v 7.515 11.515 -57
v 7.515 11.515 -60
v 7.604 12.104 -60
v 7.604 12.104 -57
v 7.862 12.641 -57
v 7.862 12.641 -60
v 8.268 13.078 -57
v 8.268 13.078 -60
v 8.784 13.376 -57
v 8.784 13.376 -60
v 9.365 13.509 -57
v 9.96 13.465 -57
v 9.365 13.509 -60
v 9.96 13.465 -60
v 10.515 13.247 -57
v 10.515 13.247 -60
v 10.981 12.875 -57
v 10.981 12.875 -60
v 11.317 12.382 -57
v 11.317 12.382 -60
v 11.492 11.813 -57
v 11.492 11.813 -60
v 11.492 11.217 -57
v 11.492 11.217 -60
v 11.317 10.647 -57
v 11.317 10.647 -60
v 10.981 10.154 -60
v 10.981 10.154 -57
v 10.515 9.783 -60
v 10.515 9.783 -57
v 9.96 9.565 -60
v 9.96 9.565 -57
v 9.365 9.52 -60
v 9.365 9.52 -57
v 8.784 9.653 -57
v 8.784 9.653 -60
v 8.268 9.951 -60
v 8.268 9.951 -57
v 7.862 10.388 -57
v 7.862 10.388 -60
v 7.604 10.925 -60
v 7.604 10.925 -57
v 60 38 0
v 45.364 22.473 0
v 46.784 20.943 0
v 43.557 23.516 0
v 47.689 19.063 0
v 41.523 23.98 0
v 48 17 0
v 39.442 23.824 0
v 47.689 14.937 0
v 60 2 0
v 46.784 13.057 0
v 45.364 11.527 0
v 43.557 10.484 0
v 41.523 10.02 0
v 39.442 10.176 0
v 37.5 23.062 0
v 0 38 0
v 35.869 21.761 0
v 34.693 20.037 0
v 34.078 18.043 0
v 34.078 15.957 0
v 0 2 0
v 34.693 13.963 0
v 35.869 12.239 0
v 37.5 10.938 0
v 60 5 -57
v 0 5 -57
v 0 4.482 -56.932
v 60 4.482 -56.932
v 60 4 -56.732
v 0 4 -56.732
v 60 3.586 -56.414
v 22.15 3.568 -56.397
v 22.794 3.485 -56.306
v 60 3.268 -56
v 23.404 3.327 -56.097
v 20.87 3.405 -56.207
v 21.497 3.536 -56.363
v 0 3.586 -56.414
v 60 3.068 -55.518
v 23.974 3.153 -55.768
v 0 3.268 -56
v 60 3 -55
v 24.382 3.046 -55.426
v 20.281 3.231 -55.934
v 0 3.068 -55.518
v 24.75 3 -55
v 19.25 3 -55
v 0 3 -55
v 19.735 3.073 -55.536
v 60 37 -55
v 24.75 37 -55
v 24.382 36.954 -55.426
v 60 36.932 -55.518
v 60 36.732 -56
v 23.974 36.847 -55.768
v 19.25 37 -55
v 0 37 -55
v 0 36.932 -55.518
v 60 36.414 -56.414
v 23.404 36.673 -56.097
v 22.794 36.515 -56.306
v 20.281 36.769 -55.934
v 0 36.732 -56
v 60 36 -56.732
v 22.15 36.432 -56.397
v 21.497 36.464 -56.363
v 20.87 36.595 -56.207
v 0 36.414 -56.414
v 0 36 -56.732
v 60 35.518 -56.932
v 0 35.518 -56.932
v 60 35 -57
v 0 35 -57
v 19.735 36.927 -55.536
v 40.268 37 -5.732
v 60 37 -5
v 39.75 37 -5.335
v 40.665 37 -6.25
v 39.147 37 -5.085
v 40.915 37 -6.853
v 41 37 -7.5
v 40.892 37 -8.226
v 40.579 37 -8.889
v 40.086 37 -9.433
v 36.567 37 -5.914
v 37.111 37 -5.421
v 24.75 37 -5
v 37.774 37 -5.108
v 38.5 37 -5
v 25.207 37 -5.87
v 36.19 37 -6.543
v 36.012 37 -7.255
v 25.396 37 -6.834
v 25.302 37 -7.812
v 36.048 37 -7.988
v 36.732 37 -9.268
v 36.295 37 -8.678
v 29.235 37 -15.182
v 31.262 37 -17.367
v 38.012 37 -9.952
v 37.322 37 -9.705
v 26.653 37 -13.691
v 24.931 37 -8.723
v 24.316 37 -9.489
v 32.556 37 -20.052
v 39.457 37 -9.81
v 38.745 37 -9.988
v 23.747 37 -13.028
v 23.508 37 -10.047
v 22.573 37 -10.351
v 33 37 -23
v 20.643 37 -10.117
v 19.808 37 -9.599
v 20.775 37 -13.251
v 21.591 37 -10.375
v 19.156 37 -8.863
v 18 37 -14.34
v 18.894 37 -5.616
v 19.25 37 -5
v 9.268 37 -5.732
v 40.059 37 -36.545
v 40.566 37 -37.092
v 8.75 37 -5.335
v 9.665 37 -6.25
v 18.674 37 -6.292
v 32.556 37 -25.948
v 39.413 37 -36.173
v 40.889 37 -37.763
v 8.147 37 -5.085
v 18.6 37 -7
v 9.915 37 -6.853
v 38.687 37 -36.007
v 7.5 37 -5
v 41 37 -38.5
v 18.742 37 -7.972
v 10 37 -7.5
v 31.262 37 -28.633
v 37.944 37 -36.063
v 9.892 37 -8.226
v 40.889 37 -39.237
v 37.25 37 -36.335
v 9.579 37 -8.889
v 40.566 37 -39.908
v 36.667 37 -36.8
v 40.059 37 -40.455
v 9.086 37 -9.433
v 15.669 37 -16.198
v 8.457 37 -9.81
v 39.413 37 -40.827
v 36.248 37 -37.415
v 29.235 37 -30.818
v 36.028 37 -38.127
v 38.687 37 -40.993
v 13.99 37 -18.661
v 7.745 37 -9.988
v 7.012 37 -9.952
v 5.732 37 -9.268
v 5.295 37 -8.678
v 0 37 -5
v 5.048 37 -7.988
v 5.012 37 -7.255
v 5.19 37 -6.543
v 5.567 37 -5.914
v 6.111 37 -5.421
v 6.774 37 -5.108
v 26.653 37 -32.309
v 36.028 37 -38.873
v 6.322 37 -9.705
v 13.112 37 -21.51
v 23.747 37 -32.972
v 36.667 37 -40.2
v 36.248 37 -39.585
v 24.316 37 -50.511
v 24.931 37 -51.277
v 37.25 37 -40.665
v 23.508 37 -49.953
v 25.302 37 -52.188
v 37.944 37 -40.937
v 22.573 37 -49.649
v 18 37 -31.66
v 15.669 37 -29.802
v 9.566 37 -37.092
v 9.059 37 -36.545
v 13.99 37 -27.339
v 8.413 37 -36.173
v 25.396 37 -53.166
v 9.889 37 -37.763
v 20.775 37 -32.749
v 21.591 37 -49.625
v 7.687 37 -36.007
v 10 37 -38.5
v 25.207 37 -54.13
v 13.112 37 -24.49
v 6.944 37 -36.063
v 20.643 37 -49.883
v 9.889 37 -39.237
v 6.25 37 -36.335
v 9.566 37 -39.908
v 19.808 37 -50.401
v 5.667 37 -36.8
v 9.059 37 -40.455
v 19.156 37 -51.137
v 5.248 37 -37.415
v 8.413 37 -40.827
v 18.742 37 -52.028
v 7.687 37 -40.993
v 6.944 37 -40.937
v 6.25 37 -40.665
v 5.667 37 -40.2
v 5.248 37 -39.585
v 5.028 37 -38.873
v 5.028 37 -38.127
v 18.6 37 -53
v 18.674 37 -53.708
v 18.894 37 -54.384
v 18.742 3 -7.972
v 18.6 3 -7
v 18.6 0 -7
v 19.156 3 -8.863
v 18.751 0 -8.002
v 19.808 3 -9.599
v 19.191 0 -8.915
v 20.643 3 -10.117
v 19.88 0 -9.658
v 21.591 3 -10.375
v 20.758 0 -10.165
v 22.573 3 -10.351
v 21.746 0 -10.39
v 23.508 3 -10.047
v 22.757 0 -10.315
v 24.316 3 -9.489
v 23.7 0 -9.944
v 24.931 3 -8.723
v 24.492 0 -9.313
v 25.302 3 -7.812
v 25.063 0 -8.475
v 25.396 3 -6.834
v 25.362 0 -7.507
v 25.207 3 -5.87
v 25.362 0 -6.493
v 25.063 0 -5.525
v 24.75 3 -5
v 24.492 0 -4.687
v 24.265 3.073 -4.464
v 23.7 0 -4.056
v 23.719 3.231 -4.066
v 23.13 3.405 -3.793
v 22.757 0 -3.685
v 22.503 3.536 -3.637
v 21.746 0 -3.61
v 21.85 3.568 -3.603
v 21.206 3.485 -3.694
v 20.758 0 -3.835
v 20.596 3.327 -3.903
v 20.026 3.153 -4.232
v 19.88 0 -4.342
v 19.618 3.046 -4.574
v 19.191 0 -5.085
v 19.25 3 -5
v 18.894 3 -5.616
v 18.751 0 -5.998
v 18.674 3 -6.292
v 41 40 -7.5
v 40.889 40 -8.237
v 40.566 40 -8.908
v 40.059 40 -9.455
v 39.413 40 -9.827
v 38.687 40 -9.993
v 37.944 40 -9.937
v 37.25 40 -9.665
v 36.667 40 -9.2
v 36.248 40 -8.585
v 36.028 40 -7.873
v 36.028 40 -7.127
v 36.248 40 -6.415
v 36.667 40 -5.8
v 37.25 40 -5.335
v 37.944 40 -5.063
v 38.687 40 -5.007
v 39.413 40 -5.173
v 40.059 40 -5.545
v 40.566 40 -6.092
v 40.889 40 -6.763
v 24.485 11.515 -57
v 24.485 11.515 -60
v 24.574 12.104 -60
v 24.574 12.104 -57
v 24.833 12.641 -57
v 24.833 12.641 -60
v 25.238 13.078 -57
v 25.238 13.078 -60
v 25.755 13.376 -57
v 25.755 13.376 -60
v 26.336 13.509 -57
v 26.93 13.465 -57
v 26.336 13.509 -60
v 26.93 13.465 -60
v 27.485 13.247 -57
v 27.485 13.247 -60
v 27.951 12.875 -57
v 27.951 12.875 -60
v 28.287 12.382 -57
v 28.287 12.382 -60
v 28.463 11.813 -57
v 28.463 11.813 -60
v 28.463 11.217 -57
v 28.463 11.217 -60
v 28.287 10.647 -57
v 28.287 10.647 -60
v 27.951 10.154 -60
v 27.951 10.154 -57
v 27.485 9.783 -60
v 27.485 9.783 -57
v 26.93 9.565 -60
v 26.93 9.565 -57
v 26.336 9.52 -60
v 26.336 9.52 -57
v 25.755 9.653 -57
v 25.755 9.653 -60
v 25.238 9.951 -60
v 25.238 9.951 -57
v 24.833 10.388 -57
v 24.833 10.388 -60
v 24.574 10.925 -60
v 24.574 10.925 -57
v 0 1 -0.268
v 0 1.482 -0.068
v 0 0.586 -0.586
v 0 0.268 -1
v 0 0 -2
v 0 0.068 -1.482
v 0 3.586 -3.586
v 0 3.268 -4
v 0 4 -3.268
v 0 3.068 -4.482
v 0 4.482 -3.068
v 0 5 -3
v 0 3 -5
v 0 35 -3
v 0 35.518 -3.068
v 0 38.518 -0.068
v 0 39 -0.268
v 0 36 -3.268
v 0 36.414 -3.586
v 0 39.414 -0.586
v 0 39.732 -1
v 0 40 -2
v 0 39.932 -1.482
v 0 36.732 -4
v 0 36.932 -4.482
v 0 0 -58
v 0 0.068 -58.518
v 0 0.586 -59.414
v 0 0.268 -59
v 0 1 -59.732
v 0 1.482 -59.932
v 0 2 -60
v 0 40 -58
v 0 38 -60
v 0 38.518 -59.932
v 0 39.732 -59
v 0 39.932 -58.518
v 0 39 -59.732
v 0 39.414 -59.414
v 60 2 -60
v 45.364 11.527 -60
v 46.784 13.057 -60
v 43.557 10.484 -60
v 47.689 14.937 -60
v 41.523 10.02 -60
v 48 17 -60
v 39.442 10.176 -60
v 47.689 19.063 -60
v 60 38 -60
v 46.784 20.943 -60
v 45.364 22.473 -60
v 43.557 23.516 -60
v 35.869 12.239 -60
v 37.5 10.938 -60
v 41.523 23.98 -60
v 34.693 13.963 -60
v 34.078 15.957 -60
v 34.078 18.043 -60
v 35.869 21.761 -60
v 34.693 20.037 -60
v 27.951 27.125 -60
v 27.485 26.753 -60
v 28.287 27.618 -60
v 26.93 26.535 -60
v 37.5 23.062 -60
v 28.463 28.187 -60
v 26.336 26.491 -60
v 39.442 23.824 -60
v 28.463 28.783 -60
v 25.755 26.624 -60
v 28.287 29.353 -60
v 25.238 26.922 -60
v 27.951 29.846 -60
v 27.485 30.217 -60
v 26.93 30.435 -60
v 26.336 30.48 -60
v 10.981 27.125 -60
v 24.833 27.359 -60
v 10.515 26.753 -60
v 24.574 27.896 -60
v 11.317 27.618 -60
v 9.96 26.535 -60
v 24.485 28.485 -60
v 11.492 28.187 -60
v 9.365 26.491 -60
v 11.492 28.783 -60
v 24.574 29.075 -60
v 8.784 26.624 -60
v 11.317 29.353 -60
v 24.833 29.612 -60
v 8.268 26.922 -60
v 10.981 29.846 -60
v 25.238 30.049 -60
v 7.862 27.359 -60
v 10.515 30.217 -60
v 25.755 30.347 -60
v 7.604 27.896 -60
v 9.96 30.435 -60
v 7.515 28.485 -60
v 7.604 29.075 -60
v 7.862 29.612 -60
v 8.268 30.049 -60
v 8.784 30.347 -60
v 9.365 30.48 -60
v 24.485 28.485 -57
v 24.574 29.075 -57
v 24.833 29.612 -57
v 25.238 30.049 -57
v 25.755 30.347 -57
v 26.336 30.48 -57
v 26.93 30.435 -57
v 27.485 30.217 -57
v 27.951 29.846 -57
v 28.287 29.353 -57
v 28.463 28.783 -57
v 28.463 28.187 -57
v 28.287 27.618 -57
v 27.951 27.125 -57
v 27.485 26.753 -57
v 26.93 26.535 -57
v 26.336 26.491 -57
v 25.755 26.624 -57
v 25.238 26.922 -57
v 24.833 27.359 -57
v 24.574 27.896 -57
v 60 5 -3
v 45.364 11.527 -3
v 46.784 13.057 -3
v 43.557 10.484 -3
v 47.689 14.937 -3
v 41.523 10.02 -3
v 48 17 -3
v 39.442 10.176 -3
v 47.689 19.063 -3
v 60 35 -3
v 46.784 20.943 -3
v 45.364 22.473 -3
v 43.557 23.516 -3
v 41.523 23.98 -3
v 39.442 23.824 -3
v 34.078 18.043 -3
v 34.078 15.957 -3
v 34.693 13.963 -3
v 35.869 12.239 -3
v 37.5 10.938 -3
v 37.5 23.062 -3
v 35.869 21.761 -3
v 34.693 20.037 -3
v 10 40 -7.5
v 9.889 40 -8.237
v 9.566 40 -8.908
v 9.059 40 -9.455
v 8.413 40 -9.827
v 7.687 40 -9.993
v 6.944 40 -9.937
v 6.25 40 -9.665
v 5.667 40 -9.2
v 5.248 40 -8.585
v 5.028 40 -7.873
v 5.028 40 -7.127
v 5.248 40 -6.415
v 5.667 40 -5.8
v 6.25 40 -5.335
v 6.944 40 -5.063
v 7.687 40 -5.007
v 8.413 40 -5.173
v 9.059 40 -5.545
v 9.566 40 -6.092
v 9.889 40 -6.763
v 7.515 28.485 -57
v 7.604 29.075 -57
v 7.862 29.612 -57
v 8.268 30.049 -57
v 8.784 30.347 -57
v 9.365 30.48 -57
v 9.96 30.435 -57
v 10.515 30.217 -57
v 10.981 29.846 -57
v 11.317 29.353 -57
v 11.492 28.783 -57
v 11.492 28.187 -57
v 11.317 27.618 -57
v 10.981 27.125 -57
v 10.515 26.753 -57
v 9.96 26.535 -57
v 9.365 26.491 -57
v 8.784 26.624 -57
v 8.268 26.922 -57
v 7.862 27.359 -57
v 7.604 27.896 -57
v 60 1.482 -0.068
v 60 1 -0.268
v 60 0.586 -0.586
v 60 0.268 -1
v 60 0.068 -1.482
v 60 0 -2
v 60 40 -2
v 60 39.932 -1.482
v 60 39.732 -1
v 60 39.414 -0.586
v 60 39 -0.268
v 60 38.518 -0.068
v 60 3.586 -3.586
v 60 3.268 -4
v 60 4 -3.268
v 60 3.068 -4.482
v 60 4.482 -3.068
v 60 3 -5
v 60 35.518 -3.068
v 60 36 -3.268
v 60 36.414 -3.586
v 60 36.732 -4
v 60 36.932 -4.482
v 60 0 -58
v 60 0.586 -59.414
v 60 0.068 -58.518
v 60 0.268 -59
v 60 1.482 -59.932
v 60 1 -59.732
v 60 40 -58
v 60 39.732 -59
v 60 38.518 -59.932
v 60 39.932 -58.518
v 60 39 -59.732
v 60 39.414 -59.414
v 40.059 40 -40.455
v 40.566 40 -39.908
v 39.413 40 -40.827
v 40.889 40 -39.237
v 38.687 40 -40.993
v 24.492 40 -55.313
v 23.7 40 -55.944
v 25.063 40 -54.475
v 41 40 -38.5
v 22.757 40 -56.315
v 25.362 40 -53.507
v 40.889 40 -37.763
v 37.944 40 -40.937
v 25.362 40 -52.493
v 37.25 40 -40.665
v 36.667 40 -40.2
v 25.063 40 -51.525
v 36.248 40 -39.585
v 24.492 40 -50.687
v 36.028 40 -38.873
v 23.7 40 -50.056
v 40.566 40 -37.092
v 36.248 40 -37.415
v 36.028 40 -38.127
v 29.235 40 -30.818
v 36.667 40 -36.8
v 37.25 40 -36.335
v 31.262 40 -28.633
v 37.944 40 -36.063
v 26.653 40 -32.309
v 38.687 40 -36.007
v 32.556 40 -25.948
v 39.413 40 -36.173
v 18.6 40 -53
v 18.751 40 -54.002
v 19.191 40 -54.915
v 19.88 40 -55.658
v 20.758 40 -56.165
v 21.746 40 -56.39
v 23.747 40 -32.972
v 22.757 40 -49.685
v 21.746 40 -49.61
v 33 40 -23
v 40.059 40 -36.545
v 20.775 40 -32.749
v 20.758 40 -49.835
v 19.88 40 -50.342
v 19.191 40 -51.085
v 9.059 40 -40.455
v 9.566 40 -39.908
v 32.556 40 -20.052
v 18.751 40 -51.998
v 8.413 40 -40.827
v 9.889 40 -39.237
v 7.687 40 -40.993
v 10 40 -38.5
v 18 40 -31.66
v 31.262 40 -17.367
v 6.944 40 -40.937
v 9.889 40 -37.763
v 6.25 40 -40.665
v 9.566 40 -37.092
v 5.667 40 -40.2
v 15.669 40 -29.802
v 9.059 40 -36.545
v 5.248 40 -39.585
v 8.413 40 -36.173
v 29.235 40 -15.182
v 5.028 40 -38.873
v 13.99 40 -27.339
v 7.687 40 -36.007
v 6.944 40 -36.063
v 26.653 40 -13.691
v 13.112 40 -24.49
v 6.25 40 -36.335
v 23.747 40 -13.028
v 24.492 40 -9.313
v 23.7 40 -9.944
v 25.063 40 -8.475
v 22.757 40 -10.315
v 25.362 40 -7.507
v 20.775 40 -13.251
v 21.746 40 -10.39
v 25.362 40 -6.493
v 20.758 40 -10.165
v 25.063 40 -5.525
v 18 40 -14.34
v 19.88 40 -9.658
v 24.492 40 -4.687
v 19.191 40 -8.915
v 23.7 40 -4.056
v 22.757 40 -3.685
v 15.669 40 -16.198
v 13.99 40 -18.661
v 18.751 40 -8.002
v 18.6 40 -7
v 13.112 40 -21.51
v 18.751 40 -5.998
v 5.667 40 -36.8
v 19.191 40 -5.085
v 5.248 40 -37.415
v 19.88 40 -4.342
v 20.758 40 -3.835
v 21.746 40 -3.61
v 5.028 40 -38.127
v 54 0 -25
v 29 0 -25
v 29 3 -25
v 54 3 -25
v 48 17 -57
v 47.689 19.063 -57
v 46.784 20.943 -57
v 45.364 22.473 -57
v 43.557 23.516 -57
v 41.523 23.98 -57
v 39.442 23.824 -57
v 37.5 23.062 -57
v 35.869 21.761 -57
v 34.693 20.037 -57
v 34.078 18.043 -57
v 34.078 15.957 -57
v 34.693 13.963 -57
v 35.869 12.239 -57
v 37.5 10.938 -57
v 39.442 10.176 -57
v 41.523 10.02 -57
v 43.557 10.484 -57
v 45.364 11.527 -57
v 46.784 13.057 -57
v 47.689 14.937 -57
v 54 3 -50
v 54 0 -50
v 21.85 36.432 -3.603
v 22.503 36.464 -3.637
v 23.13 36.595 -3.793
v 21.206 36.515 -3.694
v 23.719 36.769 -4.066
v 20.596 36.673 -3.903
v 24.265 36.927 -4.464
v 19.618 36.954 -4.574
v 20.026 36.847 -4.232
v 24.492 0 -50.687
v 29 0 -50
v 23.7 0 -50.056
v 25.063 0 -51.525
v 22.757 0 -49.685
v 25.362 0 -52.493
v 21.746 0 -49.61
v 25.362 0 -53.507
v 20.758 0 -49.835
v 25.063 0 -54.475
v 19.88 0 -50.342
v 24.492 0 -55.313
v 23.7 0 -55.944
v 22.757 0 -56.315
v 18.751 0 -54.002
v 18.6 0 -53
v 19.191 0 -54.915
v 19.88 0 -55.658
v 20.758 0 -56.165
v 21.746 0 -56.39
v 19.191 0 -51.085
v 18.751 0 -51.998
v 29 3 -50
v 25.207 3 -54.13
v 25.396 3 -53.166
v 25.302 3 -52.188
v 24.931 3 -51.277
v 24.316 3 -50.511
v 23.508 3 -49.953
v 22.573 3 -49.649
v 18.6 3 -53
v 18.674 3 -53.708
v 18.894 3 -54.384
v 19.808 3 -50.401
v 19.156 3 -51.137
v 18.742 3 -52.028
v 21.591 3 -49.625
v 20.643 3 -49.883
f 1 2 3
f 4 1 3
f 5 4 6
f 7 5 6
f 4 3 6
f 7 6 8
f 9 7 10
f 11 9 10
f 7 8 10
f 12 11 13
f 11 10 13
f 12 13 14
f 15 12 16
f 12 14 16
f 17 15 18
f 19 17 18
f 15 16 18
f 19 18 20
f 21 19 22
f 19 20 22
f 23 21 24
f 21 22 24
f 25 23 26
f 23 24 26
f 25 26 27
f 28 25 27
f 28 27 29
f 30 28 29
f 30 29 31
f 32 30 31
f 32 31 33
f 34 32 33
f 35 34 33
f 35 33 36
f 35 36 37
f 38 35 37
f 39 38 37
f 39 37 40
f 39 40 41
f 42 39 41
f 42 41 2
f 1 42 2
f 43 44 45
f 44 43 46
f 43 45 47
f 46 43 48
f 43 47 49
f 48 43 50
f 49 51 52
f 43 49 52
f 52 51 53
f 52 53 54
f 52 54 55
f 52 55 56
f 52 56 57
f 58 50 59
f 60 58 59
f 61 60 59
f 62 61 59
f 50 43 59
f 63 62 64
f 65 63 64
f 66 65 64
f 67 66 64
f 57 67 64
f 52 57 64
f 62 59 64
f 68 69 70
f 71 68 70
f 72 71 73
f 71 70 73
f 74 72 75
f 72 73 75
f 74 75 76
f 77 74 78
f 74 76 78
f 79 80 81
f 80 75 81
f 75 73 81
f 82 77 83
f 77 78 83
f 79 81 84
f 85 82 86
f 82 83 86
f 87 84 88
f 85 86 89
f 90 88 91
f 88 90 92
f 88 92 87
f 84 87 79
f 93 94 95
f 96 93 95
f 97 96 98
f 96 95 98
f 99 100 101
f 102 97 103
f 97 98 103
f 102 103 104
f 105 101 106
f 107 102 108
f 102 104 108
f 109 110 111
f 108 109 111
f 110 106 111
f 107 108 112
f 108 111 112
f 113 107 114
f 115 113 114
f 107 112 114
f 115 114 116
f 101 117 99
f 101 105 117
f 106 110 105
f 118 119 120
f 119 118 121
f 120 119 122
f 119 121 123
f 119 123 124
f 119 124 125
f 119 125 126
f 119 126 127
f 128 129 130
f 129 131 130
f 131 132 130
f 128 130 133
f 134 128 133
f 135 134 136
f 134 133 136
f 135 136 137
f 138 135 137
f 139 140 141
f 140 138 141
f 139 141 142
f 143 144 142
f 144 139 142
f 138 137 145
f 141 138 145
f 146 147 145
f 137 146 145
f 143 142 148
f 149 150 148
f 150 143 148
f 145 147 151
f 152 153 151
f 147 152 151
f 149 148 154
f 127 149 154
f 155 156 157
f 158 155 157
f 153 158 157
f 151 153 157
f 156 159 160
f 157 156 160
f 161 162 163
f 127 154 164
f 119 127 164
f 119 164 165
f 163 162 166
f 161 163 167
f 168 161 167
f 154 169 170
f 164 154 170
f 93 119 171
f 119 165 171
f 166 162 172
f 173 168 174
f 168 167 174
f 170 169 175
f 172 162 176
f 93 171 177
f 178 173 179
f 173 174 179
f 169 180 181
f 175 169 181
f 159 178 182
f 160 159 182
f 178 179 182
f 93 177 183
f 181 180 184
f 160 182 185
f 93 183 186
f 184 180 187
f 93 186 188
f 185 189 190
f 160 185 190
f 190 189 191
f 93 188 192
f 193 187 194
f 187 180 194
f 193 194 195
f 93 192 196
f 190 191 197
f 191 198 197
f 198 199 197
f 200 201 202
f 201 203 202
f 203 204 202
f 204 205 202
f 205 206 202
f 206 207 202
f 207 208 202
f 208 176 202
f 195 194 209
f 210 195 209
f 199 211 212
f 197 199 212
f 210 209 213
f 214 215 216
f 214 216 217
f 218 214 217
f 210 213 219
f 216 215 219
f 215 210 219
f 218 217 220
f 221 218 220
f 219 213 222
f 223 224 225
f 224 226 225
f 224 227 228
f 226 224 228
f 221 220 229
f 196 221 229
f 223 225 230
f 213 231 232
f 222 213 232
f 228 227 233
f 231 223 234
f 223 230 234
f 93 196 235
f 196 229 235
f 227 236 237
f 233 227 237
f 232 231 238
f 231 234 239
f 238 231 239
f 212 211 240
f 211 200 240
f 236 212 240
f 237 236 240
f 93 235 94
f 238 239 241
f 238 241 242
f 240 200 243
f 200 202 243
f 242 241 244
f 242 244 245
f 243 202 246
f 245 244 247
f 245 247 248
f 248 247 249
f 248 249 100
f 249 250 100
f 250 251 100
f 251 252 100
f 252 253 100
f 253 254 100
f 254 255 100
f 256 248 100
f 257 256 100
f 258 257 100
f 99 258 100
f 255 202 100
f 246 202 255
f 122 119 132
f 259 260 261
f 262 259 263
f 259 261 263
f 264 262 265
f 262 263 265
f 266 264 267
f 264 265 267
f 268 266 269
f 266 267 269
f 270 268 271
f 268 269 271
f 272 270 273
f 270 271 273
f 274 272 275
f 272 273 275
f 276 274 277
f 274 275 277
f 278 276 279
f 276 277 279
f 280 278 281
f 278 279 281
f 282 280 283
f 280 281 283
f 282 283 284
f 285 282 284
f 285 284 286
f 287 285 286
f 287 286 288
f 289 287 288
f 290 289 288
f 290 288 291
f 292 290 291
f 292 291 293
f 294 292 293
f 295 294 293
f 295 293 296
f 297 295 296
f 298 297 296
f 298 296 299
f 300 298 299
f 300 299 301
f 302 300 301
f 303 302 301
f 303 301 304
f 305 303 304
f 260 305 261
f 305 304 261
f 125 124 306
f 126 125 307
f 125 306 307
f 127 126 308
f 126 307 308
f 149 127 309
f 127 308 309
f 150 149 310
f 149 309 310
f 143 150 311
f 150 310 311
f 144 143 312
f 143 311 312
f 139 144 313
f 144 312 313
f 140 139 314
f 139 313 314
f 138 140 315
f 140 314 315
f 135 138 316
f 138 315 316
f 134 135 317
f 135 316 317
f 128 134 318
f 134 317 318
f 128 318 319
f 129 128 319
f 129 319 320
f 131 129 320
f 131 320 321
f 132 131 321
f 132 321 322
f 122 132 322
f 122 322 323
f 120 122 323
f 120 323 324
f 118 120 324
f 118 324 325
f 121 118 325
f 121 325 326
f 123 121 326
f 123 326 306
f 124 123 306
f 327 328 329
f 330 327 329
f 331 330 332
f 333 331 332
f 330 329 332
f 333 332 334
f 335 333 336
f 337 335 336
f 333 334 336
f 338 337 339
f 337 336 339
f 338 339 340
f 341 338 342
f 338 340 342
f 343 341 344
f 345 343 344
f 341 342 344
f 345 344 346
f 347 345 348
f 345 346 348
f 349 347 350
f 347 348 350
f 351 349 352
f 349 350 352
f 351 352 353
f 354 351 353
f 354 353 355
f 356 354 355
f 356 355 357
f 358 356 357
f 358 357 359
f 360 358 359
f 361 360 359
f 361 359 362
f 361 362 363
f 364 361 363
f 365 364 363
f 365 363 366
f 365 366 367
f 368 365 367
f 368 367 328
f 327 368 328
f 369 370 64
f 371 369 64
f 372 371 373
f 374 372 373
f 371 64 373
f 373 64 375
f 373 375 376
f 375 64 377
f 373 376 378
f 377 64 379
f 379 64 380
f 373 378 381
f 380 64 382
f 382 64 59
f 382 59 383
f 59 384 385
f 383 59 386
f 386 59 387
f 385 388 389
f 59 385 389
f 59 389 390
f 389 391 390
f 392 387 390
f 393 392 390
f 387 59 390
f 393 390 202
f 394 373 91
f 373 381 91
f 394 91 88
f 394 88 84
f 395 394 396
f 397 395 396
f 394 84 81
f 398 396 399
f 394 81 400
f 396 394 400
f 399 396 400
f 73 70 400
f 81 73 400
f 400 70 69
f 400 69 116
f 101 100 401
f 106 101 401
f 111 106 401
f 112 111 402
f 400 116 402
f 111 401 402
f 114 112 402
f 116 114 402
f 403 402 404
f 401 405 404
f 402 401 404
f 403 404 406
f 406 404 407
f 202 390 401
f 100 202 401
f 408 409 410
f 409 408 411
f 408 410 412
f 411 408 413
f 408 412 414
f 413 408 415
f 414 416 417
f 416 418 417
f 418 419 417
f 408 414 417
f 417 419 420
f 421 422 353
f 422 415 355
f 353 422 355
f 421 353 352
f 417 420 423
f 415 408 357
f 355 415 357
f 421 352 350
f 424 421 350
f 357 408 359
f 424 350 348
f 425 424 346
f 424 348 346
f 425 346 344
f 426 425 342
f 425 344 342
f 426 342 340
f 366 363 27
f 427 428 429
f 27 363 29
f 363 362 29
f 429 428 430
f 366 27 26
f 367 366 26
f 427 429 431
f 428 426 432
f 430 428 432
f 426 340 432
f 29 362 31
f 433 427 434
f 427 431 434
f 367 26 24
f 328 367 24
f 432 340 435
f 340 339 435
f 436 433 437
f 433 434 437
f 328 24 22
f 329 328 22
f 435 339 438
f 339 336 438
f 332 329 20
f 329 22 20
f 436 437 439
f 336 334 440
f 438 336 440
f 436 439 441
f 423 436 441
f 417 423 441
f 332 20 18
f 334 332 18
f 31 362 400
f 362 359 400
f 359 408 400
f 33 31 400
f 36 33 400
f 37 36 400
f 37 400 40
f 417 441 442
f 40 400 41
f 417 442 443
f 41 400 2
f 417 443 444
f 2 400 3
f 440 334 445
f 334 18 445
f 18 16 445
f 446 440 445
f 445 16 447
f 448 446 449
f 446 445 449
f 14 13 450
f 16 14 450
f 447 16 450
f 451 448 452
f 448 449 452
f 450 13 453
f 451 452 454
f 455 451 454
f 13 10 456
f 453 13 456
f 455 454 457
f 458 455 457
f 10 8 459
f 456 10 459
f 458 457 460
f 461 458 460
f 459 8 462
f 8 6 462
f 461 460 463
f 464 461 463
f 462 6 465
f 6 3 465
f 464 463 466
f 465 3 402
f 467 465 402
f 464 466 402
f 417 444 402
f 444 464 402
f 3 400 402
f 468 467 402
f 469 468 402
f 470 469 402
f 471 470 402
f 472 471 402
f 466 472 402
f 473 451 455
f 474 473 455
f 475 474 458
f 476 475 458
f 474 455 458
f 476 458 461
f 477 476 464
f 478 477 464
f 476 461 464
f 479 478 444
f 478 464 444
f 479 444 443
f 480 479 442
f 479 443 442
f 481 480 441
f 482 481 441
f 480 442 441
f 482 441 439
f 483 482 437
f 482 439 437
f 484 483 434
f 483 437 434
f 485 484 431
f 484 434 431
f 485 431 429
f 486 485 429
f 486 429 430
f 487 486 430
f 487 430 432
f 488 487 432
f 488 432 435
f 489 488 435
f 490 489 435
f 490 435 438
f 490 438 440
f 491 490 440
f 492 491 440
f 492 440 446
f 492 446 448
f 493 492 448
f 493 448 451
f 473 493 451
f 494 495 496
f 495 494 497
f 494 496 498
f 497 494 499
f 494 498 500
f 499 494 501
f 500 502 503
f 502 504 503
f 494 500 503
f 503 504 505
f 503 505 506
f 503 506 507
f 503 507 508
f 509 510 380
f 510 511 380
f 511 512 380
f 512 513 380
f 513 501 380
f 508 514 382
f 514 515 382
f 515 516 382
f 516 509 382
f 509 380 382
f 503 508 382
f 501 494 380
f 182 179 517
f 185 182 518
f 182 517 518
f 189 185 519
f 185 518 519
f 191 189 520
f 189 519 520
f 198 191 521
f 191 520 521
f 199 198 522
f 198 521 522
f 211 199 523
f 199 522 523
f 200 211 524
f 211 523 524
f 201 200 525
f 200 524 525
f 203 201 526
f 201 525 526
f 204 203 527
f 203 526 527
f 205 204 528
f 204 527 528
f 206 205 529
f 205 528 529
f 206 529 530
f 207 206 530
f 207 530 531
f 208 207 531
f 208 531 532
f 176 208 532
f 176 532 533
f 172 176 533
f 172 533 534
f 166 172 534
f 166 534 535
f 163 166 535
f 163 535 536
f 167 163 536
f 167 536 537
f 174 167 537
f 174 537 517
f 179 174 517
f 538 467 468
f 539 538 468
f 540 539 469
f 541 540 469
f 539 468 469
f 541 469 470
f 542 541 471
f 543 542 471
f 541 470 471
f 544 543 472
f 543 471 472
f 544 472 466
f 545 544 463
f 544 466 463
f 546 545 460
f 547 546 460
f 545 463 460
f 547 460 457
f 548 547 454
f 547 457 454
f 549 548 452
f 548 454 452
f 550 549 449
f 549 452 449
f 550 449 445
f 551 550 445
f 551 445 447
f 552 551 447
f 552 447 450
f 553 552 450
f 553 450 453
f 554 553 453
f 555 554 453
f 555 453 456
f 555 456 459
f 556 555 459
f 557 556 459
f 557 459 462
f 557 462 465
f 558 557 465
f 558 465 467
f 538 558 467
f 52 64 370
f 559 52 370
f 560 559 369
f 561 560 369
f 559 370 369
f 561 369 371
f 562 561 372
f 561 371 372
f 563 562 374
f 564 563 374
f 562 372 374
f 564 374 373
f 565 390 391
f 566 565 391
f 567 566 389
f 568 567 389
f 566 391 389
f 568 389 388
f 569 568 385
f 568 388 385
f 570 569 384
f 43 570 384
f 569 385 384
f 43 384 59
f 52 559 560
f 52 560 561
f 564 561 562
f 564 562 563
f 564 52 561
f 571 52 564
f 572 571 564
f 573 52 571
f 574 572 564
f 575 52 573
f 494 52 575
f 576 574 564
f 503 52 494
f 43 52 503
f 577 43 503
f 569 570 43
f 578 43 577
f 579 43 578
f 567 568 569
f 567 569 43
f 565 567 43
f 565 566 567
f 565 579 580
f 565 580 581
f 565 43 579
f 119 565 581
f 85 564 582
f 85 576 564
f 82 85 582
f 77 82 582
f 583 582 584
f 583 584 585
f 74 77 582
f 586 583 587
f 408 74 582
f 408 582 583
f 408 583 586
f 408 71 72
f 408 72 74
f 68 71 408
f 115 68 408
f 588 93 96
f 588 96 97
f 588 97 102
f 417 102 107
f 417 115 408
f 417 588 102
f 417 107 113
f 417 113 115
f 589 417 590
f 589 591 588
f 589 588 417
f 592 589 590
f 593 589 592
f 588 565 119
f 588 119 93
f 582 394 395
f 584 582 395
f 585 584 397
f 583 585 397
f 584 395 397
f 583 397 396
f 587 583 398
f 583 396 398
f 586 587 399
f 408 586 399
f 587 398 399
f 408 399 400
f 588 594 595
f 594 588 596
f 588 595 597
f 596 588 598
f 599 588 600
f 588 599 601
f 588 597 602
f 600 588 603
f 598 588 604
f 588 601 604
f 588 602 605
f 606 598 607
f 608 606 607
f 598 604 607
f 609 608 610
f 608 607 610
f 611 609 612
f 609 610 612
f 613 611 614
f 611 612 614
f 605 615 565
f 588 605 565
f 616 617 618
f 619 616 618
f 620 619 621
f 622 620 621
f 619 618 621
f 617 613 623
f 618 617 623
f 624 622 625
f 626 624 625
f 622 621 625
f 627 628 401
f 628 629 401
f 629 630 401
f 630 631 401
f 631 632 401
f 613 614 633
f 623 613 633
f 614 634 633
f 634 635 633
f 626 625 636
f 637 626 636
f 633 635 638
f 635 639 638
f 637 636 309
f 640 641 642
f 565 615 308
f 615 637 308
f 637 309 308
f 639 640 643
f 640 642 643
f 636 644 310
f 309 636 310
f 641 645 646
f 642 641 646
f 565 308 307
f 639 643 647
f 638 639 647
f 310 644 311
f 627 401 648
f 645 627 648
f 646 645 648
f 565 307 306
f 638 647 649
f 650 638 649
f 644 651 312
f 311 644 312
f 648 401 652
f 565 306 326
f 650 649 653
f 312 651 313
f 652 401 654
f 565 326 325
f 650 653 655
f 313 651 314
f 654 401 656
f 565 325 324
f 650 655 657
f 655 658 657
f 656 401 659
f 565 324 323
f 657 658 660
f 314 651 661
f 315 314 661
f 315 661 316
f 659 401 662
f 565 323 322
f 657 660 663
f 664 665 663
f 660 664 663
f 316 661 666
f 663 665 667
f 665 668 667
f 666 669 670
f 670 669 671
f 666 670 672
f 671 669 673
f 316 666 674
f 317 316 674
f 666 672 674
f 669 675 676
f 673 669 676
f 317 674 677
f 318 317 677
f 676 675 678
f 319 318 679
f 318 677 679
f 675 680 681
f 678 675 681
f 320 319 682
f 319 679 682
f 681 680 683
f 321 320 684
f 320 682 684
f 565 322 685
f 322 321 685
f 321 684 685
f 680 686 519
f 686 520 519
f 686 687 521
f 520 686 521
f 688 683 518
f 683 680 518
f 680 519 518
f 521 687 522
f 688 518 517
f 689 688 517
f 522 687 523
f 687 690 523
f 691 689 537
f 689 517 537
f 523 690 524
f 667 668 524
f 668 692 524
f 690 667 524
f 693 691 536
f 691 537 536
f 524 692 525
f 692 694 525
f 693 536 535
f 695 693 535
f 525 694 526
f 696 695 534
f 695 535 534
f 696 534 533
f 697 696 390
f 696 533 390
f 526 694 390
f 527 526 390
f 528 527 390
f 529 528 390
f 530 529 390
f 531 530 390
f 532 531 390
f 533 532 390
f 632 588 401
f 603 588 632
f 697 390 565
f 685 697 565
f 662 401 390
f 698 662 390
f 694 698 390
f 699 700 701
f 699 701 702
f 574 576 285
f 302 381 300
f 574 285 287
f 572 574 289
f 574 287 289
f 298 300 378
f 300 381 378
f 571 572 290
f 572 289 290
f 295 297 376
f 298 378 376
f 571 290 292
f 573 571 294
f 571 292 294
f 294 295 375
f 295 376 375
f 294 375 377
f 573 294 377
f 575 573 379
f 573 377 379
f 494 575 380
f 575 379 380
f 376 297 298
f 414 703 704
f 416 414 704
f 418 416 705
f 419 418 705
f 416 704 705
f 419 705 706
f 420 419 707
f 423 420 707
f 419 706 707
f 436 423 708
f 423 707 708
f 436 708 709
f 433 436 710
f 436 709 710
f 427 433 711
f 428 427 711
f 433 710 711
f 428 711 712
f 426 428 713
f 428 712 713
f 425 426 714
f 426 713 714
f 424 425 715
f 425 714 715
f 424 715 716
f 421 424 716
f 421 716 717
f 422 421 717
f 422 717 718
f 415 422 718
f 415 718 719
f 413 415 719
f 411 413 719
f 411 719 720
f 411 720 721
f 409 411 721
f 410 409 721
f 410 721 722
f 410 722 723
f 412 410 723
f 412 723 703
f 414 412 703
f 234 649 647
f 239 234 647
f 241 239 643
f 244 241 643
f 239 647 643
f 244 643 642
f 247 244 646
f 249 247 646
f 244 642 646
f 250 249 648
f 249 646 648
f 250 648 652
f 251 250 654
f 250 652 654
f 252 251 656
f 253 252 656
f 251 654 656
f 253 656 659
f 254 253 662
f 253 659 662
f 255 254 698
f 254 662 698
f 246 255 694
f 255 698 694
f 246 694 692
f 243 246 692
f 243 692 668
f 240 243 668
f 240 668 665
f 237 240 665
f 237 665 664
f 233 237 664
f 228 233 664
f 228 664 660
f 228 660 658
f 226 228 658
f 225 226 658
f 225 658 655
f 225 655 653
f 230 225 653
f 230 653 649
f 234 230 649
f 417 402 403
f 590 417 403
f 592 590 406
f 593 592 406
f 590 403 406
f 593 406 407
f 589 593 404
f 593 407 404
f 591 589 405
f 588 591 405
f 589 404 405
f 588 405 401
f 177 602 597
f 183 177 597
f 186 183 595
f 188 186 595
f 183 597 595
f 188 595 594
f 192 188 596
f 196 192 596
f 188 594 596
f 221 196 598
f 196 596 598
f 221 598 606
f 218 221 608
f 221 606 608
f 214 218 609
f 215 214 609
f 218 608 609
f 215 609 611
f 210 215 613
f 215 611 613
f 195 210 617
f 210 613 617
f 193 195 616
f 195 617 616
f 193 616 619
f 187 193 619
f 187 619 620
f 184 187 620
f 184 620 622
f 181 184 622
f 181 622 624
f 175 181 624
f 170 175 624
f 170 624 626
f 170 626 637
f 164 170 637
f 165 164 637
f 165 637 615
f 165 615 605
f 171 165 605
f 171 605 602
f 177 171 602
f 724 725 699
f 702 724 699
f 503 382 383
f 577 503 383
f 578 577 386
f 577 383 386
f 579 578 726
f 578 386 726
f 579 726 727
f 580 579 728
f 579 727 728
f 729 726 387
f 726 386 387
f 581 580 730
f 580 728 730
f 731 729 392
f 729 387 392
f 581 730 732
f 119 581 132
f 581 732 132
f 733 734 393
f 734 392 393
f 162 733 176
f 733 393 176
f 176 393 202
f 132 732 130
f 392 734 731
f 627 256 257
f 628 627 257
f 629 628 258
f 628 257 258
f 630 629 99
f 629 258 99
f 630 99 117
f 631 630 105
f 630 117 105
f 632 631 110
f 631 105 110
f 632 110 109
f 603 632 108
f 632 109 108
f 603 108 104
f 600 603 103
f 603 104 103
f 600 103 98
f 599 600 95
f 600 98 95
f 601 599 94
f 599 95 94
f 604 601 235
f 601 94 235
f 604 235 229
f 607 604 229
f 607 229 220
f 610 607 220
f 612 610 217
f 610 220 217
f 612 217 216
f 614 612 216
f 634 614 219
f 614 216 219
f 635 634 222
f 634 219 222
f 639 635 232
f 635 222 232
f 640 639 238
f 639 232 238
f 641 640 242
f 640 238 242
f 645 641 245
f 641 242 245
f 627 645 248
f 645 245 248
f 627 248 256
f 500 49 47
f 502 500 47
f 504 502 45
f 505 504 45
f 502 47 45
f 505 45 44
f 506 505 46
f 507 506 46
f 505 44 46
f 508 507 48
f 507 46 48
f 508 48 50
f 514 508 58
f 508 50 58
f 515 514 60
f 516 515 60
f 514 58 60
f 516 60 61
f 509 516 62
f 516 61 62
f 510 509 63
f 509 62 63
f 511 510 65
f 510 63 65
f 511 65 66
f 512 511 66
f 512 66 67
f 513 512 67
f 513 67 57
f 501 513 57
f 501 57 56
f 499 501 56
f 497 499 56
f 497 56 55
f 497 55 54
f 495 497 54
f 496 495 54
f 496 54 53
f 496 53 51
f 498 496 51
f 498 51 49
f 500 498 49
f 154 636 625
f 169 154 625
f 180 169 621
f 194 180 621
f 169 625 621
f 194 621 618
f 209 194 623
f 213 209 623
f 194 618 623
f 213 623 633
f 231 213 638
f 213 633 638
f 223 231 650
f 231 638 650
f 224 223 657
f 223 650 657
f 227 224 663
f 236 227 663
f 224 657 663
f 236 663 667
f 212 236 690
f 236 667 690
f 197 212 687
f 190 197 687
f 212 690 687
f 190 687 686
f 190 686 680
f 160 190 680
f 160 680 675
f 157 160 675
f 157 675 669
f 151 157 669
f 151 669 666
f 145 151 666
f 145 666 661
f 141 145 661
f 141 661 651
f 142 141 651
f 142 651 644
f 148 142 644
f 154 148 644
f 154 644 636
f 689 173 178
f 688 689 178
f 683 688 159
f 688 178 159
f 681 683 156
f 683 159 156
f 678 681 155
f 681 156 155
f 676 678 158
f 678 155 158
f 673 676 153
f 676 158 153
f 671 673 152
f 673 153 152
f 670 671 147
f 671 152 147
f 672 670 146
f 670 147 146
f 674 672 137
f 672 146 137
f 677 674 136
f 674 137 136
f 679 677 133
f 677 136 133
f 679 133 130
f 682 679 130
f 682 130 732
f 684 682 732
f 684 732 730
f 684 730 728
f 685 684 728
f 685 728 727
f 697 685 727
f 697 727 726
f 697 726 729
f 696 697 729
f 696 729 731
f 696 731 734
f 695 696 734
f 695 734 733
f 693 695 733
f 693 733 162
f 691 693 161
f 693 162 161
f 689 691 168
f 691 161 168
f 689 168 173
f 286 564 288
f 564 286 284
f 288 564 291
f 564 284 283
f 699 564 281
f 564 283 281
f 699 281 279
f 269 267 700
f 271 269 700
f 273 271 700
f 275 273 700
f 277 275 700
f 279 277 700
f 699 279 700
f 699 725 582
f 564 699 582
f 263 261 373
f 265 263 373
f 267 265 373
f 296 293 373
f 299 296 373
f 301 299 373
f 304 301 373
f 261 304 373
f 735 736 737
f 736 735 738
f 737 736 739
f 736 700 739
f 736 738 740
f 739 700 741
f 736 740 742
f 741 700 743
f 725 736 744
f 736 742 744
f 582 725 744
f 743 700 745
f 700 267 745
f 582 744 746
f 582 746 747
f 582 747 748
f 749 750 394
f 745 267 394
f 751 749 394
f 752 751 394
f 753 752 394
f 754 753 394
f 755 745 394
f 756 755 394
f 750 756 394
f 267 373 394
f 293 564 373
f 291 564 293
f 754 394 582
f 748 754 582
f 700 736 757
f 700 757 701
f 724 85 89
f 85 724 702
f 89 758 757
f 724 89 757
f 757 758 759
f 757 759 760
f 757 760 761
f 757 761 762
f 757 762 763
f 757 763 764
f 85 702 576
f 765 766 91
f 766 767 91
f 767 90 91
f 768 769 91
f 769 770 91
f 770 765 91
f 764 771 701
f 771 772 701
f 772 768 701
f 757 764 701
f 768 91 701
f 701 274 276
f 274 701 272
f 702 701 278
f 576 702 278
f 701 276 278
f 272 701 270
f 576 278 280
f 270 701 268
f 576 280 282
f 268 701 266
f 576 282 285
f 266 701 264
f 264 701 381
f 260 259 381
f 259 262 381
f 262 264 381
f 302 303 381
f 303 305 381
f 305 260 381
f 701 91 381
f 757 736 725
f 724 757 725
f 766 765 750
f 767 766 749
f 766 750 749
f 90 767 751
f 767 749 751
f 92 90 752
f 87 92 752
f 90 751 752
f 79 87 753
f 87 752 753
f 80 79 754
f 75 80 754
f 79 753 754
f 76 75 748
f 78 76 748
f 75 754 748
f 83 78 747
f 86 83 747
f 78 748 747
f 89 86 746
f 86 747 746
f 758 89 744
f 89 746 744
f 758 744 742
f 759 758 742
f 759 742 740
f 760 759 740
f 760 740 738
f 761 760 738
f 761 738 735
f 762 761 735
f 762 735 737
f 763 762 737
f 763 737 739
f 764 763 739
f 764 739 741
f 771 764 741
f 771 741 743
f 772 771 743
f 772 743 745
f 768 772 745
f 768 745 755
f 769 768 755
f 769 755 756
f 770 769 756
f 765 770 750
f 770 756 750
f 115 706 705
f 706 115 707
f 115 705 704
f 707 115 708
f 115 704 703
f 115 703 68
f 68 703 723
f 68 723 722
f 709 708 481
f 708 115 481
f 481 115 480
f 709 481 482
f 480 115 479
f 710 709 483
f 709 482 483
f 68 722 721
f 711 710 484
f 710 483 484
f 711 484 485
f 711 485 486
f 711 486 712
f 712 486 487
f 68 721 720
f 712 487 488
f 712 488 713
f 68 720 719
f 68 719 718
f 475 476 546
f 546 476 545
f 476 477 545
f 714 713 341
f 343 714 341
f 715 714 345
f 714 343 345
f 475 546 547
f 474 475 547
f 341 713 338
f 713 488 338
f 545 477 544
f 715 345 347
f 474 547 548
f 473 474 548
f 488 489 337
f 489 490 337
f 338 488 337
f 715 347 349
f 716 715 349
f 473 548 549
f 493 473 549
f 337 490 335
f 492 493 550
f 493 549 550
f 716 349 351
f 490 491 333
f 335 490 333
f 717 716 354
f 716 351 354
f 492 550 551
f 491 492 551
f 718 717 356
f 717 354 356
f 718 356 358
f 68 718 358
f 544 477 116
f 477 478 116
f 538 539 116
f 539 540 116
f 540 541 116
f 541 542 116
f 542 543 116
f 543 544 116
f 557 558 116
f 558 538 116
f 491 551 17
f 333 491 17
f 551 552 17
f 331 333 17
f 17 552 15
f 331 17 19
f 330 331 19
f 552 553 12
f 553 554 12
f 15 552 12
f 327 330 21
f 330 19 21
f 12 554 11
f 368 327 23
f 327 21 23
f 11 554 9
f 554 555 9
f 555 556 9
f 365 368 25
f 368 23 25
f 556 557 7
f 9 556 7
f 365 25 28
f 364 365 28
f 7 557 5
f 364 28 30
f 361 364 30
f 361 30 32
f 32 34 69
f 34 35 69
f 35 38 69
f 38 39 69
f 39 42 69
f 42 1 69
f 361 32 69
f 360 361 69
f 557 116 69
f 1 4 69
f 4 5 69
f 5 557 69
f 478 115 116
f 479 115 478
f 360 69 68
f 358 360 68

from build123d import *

# Parameters (mm, degrees)
EXTRUDE_1_DEPTH     = 60
CUT_EXTRUDE_1_REACH = 42
SKETCH_2_R          = 2.5
SKETCH_2_R_2        = 10
SKETCH_3_R          = 7
CUT_EXTRUDE_2_DEPTH = 61
HOLE_WIZARD_M8_1_D  = 6.8
CUT_EXTRUDE_3_REACH = 62
SKETCH_6_R          = 2
CUT_EXTRUDE_4_REACH = 42
SKETCH_7_W          = 25
SKETCH_7_H          = 25


with BuildPart() as part:
    # 草图1 → 凸台-拉伸1 (new body)
    with BuildSketch(Plane(origin=(0, 0, 0), x_dir=(0, 0, -1), z_dir=(1, 0, 0))):
        with BuildLine():
            Line((60, 2), (60, 38))
            ThreePointArc((60, 38), (59.414213562, 39.414213562), (58, 40))
            Line((58, 40), (2, 40))
            ThreePointArc((2, 40), (0.585786438, 39.414213562), (0, 38))
            Line((0, 38), (0, 2))
            ThreePointArc((0, 2), (0.585786438, 0.585786438), (2, 0))
            Line((2, 0), (58, 0))
            ThreePointArc((58, 0), (59.414213562, 0.585786438), (60, 2))
        make_face()
        with BuildLine():
            Line((3, 5), (3, 35))
            ThreePointArc((3, 35), (3.585786438, 36.414213562), (5, 37))
            Line((5, 37), (55, 37))
            ThreePointArc((55, 37), (56.414213562, 36.414213562), (57, 35))
            Line((57, 35), (57, 5))
            ThreePointArc((57, 5), (56.414213562, 3.585786438), (55, 3))
            Line((55, 3), (5, 3))
            ThreePointArc((5, 3), (3.585786438, 3.585786438), (3, 5))
        make_face(mode=Mode.SUBTRACT)
    extrude(amount=EXTRUDE_1_DEPTH)

    # 草图2 → 切除-拉伸1 (cut, up to next)
    with BuildSketch(Plane(origin=(0, 40, 0), x_dir=(1, 0, 0), z_dir=(0, 1, 0)), mode=Mode.PRIVATE) as cut_extrude_1_sk1:
        with Locations((7.5, 7.5)):
            Circle(SKETCH_2_R)
    cut_extrude_1_tool1 = extrude(cut_extrude_1_sk1.sketch, amount=-CUT_EXTRUDE_1_REACH, mode=Mode.PRIVATE) & part.part
    add(cut_extrude_1_tool1.solids().sort_by_distance((7.5, 40, -7.5))[0], mode=Mode.SUBTRACT)
    # 草图2 → 切除-拉伸1 (cut, up to next)
    with BuildSketch(Plane(origin=(0, 40, 0), x_dir=(1, 0, 0), z_dir=(0, 1, 0)), mode=Mode.PRIVATE) as cut_extrude_1_sk2:
        with Locations((38.5, 7.5)):
            Circle(SKETCH_2_R)
    cut_extrude_1_tool2 = extrude(cut_extrude_1_sk2.sketch, amount=-CUT_EXTRUDE_1_REACH, mode=Mode.PRIVATE) & part.part
    add(cut_extrude_1_tool2.solids().sort_by_distance((38.5, 40, -7.5))[0], mode=Mode.SUBTRACT)
    # 草图2 → 切除-拉伸1 (cut, up to next)
    with BuildSketch(Plane(origin=(0, 40, 0), x_dir=(1, 0, 0), z_dir=(0, 1, 0)), mode=Mode.PRIVATE) as cut_extrude_1_sk3:
        with Locations((38.5, 38.5)):
            Circle(SKETCH_2_R)
    cut_extrude_1_tool3 = extrude(cut_extrude_1_sk3.sketch, amount=-CUT_EXTRUDE_1_REACH, mode=Mode.PRIVATE) & part.part
    add(cut_extrude_1_tool3.solids().sort_by_distance((38.5, 40, -38.5))[0], mode=Mode.SUBTRACT)
    # 草图2 → 切除-拉伸1 (cut, up to next)
    with BuildSketch(Plane(origin=(0, 40, 0), x_dir=(1, 0, 0), z_dir=(0, 1, 0)), mode=Mode.PRIVATE) as cut_extrude_1_sk4:
        with Locations((7.5, 38.5)):
            Circle(SKETCH_2_R)
    cut_extrude_1_tool4 = extrude(cut_extrude_1_sk4.sketch, amount=-CUT_EXTRUDE_1_REACH, mode=Mode.PRIVATE) & part.part
    add(cut_extrude_1_tool4.solids().sort_by_distance((7.5, 40, -38.5))[0], mode=Mode.SUBTRACT)
    # 草图2 → 切除-拉伸1 (cut, up to next)
    with BuildSketch(Plane(origin=(0, 40, 0), x_dir=(1, 0, 0), z_dir=(0, 1, 0)), mode=Mode.PRIVATE) as cut_extrude_1_sk5:
        with Locations((23, 23)):
            Circle(SKETCH_2_R_2)
    cut_extrude_1_tool5 = extrude(cut_extrude_1_sk5.sketch, amount=-CUT_EXTRUDE_1_REACH, mode=Mode.PRIVATE) & part.part
    add(cut_extrude_1_tool5.solids().sort_by_distance((23, 40, -23))[0], mode=Mode.SUBTRACT)

    # 草图3 → 切除-拉伸2 (cut, through all)
    with BuildSketch(Plane.XY):
        with Locations((41, 17)):
            Circle(SKETCH_3_R)
    extrude(amount=-CUT_EXTRUDE_2_DEPTH, mode=Mode.SUBTRACT)

    # M8 螺纹孔1 (through all)
    with Locations(Plane(origin=(0, 40, 0), x_dir=(1, 0, 0), z_dir=(0, 1, 0))):
        with Locations((22, 53), (22, 7)):
            Hole(HOLE_WIZARD_M8_1_D / 2)

    # 草图6 → 切除-拉伸3 (cut, up to next)
    with BuildSketch(Plane(origin=(0, 0, -60), x_dir=(-1, 0, 0), z_dir=(0, 0, -1)), mode=Mode.PRIVATE) as cut_extrude_3_sk1:
        with Locations((-9.514718626, 11.514718626)):
            Circle(SKETCH_6_R)
    cut_extrude_3_tool1 = extrude(cut_extrude_3_sk1.sketch, amount=-CUT_EXTRUDE_3_REACH, mode=Mode.PRIVATE) & part.part
    add(cut_extrude_3_tool1.solids().sort_by_distance((9.514719, 11.514719, -60))[0], mode=Mode.SUBTRACT)
    # 草图6 → 切除-拉伸3 (cut, up to next)
    with BuildSketch(Plane(origin=(0, 0, -60), x_dir=(-1, 0, 0), z_dir=(0, 0, -1)), mode=Mode.PRIVATE) as cut_extrude_3_sk2:
        with Locations((-26.485281374, 11.514718626)):
            Circle(SKETCH_6_R)
    cut_extrude_3_tool2 = extrude(cut_extrude_3_sk2.sketch, amount=-CUT_EXTRUDE_3_REACH, mode=Mode.PRIVATE) & part.part
    add(cut_extrude_3_tool2.solids().sort_by_distance((26.485281, 11.514719, -60))[0], mode=Mode.SUBTRACT)
    # 草图6 → 切除-拉伸3 (cut, up to next)
    with BuildSketch(Plane(origin=(0, 0, -60), x_dir=(-1, 0, 0), z_dir=(0, 0, -1)), mode=Mode.PRIVATE) as cut_extrude_3_sk3:
        with Locations((-26.485281374, 28.485281374)):
            Circle(SKETCH_6_R)
    cut_extrude_3_tool3 = extrude(cut_extrude_3_sk3.sketch, amount=-CUT_EXTRUDE_3_REACH, mode=Mode.PRIVATE) & part.part
    add(cut_extrude_3_tool3.solids().sort_by_distance((26.485281, 28.485281, -60))[0], mode=Mode.SUBTRACT)
    # 草图6 → 切除-拉伸3 (cut, up to next)
    with BuildSketch(Plane(origin=(0, 0, -60), x_dir=(-1, 0, 0), z_dir=(0, 0, -1)), mode=Mode.PRIVATE) as cut_extrude_3_sk4:
        with Locations((-9.514718626, 28.485281374)):
            Circle(SKETCH_6_R)
    cut_extrude_3_tool4 = extrude(cut_extrude_3_sk4.sketch, amount=-CUT_EXTRUDE_3_REACH, mode=Mode.PRIVATE) & part.part
    add(cut_extrude_3_tool4.solids().sort_by_distance((9.514719, 28.485281, -60))[0], mode=Mode.SUBTRACT)

    # 草图7 → 切除-拉伸4 (cut, up to next)
    with BuildSketch(Plane.XZ, mode=Mode.PRIVATE) as cut_extrude_4_sk1:
        with Locations((41.5, -37.5)):
            Rectangle(SKETCH_7_W, SKETCH_7_H)
    cut_extrude_4_tool1 = extrude(cut_extrude_4_sk1.sketch, amount=-CUT_EXTRUDE_4_REACH, mode=Mode.PRIVATE) & part.part
    add(cut_extrude_4_tool1.solids().sort_by_distance((41.5, 0, -37.5))[0], mode=Mode.SUBTRACT)


solid = part.part
